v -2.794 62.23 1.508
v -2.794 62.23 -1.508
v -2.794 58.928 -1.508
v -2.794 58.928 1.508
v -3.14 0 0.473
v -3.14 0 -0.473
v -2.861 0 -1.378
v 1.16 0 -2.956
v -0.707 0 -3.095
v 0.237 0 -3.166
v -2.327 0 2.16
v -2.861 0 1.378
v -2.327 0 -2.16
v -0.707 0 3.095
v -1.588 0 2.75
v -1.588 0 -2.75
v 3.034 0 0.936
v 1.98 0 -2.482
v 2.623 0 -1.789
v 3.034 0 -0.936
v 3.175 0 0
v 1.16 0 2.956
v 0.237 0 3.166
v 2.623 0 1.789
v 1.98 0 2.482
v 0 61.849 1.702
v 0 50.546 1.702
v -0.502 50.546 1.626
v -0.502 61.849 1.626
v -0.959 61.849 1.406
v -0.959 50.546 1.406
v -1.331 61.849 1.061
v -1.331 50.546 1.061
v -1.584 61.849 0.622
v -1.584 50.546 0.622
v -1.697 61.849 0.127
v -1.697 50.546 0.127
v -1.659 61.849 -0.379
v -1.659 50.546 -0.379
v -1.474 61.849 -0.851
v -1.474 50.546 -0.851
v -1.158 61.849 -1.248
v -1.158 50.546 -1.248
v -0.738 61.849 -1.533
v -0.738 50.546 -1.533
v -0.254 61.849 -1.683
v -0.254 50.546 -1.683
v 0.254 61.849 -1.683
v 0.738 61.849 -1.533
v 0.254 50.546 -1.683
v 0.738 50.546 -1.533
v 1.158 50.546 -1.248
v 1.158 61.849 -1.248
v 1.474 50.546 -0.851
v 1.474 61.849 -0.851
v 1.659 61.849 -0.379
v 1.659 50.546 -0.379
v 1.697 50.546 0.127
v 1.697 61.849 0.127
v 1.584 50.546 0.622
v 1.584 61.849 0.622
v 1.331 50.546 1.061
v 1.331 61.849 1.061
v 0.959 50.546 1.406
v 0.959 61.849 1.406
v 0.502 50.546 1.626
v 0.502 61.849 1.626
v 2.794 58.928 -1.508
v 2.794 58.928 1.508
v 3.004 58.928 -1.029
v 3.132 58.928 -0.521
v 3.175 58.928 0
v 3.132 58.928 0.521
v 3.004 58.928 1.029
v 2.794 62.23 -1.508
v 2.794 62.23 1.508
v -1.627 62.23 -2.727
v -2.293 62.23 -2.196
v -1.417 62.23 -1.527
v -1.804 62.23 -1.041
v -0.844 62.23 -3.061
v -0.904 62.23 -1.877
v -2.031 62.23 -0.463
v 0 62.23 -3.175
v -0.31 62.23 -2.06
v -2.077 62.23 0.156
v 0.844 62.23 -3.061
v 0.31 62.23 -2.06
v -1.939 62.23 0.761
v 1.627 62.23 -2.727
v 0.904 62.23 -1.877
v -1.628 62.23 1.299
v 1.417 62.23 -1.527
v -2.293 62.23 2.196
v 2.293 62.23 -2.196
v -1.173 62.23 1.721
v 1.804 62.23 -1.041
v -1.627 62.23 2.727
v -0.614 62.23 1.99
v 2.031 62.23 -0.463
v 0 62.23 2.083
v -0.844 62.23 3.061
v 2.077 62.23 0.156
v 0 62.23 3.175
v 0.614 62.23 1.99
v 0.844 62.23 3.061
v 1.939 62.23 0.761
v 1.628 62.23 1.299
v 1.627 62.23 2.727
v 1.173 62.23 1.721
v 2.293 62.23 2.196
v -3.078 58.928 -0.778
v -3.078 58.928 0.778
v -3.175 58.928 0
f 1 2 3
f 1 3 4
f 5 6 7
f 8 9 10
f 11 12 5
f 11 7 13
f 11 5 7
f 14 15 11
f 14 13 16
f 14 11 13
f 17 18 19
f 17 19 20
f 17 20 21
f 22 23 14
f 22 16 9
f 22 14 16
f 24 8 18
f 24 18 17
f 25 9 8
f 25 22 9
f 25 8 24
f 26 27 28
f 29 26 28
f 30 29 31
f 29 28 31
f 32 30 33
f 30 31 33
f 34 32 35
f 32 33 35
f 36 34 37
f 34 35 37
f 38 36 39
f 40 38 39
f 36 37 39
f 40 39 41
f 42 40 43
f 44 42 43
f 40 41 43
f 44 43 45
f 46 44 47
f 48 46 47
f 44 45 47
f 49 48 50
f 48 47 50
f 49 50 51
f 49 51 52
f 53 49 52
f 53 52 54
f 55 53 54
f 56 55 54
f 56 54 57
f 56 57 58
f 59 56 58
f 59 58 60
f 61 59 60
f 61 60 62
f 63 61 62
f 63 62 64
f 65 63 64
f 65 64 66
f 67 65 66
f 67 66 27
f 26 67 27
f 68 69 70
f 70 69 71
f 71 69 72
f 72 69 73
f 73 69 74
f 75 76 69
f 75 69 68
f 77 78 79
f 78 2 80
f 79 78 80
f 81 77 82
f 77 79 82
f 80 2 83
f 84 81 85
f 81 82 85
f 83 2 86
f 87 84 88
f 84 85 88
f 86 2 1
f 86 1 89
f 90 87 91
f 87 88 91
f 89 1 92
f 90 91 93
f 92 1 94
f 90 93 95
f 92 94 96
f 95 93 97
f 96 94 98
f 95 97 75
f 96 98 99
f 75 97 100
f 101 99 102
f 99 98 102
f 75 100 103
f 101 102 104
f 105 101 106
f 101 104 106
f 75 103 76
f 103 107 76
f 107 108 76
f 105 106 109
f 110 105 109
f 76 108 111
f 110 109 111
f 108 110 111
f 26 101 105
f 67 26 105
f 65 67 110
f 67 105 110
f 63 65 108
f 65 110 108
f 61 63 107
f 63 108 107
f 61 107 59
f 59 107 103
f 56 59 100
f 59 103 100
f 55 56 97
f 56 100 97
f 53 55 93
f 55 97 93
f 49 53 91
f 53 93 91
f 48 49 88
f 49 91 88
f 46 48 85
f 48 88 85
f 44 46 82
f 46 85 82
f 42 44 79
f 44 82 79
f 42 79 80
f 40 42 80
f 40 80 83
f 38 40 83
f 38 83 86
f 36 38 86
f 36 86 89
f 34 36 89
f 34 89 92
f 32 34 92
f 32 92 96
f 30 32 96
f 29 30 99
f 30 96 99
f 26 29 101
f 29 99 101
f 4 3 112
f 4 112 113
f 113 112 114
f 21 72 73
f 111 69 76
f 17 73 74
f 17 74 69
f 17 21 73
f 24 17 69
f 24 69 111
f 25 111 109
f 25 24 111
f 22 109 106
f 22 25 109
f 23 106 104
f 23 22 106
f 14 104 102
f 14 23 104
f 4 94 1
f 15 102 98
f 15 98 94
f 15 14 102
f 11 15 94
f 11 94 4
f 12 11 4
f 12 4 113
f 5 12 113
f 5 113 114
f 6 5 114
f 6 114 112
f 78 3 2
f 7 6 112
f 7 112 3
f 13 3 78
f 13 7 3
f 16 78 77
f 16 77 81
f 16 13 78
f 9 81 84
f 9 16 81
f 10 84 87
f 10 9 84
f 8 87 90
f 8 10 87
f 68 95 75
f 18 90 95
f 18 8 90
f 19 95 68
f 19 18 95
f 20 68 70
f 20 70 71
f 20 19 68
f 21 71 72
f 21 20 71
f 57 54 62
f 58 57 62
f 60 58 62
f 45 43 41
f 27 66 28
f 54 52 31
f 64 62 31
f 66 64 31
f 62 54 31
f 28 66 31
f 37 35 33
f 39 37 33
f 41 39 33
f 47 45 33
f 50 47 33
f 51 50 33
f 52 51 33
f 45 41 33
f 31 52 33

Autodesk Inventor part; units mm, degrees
sketch "Sketch_1" plane through (0, 0, 0) normal (0, 0, 1) x (1, 0, 0)
  line L0 (0, 0) -> (0, 62.23)
  line L1 (0, 62.23) -> (3.175, 62.23)
  line L2 (3.175, 62.23) -> (3.175, 0)
  line L3 (3.175, 0) -> (0, 0)
  line L4 (0, 0) -> (0, 62.23)
revolve "Revolution1" add sketch "Sketch_1" angle 360 about axis through (0, 0, 0) along (0, -1, 0)
sketch "Sketch2" plane through (0, 62.23, 0) normal (0, 1, 0) x (1, 0, 0)
  point P0 (0, 0)
hole "Hole1" at (0, 62.23, 0) direction (0, -1, 0) diameter 3.4036 depth 11.684 countersink diameter 4.1656 countersink angle 90 thread size "8-36 UNF" class "2B" standard "ANSI Unified Screw Threads"
sketch "Sketch_29" plane through (0, 62.23, 0) normal (0, 1, 0) x (1, 0, 0)
  line L0 (-5.588, 12.7) -> (-5.588, -12.7)
  line L1 (-5.588, -12.7) -> (5.588, -12.7)
  line L2 (5.588, -12.7) -> (5.588, 12.7)
  line L3 (5.588, 12.7) -> (-5.588, 12.7)
  line L4 (-2.794, 6.35) -> (-2.794, -6.35)
  line L5 (-2.794, -6.35) -> (2.794, -6.35)
  line L6 (2.794, -6.35) -> (2.794, 6.35)
  line L7 (2.794, 6.35) -> (-2.794, 6.35)
extrude "Extrusion1" cut sketch "Sketch_29" against normal blind 3.302
ref_plane "b11_XY" through (0, 0, 0) normal (0, 1, 0) x (1, 0, 0)
ref_plane "b11_YZ" through (0, 0, 0) normal (1, 0, 0) x (0, 0, -1)
ref_plane "b11_ZX" through (0, 0, 0) normal (0, 0, -1) x (0, 1, 0)
ref_plane "b2_XY" through (0, 62.23, 0) normal (0, 1, 0) x (1, 0, 0)
ref_plane "b2_YZ" through (0, 62.23, 0) normal (1, 0, 0) x (0, 0, -1)
ref_plane "b2_ZX" through (0, 62.23, 0) normal (0, 0, -1) x (0, 1, 0)
ref_plane "e1_XY" through (0, 62.23, -2.0828) normal (1, 0, 0) x (0, 0, -1)
ref_plane "e1_YZ" through (0, 62.23, -2.0828) normal (0, 0, -1) x (0, 1, 0)
ref_plane "e1_ZX" through (0, 62.23, -2.0828) normal (0, 1, 0) x (1, 0, 0)
ref_plane "e2_XY" through (0, 62.23, 2.0828) normal (1, 0, 0) x (0, 0, -1)
ref_plane "e2_YZ" through (0, 62.23, 2.0828) normal (0, 0, -1) x (0, 1, 0)
ref_plane "e2_ZX" through (0, 62.23, 2.0828) normal (0, 1, 0) x (1, 0, 0)
ref_plane "f1_XY" through (0, 62.23, 3.175) normal (1, 0, 0) x (0, 0, -1)
ref_plane "f1_YZ" through (0, 62.23, 3.175) normal (0, 0, -1) x (0, 1, 0)
ref_plane "f1_ZX" through (0, 62.23, 3.175) normal (0, 1, 0) x (1, 0, 0)
ref_plane "f2_XY" through (0, 62.23, -3.175) normal (1, 0, 0) x (0, 0, -1)
ref_plane "f2_YZ" through (0, 62.23, -3.175) normal (0, 0, -1) x (0, 1, 0)
ref_plane "f2_ZX" through (0, 62.23, -3.175) normal (0, 1, 0) x (1, 0, 0)
ref_plane "h1_XY" through (-2.794, 62.23, 0) normal (0, 1, 0) x (1, 0, 0)
ref_plane "h1_YZ" through (-2.794, 62.23, 0) normal (1, 0, 0) x (0, 0, -1)
ref_plane "h1_ZX" through (-2.794, 62.23, 0) normal (0, 0, -1) x (0, 1, 0)
ref_plane "h2_XY" through (2.794, 62.23, 0) normal (0, 1, 0) x (1, 0, 0)
ref_plane "h2_YZ" through (2.794, 62.23, 0) normal (1, 0, 0) x (0, 0, -1)
ref_plane "h2_ZX" through (2.794, 62.23, 0) normal (0, 0, -1) x (0, 1, 0)
ref_plane "rod_XY" through (0, 62.23, 0) normal (0, 1, 0) x (1, 0, 0)
ref_plane "rod_YZ" through (0, 62.23, 0) normal (1, 0, 0) x (0, 0, -1)
ref_plane "rod_ZX" through (0, 62.23, 0) normal (0, 0, -1) x (0, 1, 0)
ref_plane "rod_to_part_XY" through (0, 0, 0) normal (0, 1, 0) x (1, 0, 0)
ref_plane "rod_to_part_YZ" through (0, 0, 0) normal (1, 0, 0) x (0, 0, -1)
ref_plane "rod_to_part_ZX" through (0, 0, 0) normal (0, 0, -1) x (0, 1, 0)
ref_plane "to_rod_pivot_XY" through (0, 62.23, 0) normal (0, 1, 0) x (1, 0, 0)
ref_plane "to_rod_pivot_YZ" through (0, 62.23, 0) normal (1, 0, 0) x (0, 0, -1)
ref_plane "to_rod_pivot_ZX" through (0, 62.23, 0) normal (0, 0, -1) x (0, 1, 0)
ref_plane "to_rod_pivot1_XY" through (0, 0, 0) normal (0, 1, 0) x (1, 0, 0)
ref_plane "to_rod_pivot1_YZ" through (0, 0, 0) normal (1, 0, 0) x (0, 0, -1)
ref_plane "to_rod_pivot1_ZX" through (0, 0, 0) normal (0, 0, -1) x (0, 1, 0)
properties part number "022.452.45-FO1_BM_rod" material "Steel"
